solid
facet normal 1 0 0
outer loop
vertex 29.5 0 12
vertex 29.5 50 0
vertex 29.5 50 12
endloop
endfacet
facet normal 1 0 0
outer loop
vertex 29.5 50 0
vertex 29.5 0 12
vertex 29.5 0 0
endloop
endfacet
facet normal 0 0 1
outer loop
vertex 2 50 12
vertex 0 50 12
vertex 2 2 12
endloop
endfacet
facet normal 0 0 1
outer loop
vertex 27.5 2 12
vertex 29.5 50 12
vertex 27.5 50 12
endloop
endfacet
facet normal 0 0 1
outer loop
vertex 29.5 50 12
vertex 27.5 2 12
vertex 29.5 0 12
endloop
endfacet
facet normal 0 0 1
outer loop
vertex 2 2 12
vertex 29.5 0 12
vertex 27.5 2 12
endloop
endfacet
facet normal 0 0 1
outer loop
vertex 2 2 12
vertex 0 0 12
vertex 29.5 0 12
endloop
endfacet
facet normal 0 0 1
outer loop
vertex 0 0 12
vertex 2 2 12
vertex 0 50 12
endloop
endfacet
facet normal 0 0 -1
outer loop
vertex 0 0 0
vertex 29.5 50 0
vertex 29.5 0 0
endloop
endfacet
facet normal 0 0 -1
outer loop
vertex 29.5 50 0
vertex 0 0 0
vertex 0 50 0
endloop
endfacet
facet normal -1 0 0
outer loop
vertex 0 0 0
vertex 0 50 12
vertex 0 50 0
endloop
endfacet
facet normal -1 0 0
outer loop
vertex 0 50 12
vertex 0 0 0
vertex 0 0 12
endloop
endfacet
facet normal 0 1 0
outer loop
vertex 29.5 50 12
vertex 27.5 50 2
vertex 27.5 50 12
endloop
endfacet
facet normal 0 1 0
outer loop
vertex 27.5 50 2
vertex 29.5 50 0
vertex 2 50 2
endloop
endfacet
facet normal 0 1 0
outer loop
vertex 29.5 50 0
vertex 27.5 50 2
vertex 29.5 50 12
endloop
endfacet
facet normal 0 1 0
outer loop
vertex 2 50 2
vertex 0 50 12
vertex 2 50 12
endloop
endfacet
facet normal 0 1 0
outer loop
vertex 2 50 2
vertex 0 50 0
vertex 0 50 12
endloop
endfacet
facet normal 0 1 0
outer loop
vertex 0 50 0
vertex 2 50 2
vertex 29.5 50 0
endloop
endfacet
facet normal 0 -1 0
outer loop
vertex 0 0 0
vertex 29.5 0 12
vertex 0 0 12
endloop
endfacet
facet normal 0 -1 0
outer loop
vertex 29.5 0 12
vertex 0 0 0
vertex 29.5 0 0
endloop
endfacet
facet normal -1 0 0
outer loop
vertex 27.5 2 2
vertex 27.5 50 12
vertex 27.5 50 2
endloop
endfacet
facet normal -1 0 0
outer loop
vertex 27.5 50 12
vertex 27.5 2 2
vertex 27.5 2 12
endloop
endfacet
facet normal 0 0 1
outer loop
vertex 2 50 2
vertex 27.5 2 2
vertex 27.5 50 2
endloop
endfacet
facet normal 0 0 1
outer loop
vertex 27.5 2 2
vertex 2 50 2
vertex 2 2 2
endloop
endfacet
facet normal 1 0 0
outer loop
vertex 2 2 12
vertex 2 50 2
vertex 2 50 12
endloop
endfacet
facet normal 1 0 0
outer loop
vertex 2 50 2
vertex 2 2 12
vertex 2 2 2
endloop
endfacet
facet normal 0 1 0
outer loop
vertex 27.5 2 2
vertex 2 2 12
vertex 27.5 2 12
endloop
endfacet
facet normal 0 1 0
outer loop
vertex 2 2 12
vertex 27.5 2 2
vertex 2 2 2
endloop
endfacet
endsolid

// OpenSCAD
intW=25.5;
l=50;
wall=2;

difference() {
    cube([intW + 2*wall, l, 12]);
    translate([wall, wall, wall]) cube([intW, l, 12]);
}
